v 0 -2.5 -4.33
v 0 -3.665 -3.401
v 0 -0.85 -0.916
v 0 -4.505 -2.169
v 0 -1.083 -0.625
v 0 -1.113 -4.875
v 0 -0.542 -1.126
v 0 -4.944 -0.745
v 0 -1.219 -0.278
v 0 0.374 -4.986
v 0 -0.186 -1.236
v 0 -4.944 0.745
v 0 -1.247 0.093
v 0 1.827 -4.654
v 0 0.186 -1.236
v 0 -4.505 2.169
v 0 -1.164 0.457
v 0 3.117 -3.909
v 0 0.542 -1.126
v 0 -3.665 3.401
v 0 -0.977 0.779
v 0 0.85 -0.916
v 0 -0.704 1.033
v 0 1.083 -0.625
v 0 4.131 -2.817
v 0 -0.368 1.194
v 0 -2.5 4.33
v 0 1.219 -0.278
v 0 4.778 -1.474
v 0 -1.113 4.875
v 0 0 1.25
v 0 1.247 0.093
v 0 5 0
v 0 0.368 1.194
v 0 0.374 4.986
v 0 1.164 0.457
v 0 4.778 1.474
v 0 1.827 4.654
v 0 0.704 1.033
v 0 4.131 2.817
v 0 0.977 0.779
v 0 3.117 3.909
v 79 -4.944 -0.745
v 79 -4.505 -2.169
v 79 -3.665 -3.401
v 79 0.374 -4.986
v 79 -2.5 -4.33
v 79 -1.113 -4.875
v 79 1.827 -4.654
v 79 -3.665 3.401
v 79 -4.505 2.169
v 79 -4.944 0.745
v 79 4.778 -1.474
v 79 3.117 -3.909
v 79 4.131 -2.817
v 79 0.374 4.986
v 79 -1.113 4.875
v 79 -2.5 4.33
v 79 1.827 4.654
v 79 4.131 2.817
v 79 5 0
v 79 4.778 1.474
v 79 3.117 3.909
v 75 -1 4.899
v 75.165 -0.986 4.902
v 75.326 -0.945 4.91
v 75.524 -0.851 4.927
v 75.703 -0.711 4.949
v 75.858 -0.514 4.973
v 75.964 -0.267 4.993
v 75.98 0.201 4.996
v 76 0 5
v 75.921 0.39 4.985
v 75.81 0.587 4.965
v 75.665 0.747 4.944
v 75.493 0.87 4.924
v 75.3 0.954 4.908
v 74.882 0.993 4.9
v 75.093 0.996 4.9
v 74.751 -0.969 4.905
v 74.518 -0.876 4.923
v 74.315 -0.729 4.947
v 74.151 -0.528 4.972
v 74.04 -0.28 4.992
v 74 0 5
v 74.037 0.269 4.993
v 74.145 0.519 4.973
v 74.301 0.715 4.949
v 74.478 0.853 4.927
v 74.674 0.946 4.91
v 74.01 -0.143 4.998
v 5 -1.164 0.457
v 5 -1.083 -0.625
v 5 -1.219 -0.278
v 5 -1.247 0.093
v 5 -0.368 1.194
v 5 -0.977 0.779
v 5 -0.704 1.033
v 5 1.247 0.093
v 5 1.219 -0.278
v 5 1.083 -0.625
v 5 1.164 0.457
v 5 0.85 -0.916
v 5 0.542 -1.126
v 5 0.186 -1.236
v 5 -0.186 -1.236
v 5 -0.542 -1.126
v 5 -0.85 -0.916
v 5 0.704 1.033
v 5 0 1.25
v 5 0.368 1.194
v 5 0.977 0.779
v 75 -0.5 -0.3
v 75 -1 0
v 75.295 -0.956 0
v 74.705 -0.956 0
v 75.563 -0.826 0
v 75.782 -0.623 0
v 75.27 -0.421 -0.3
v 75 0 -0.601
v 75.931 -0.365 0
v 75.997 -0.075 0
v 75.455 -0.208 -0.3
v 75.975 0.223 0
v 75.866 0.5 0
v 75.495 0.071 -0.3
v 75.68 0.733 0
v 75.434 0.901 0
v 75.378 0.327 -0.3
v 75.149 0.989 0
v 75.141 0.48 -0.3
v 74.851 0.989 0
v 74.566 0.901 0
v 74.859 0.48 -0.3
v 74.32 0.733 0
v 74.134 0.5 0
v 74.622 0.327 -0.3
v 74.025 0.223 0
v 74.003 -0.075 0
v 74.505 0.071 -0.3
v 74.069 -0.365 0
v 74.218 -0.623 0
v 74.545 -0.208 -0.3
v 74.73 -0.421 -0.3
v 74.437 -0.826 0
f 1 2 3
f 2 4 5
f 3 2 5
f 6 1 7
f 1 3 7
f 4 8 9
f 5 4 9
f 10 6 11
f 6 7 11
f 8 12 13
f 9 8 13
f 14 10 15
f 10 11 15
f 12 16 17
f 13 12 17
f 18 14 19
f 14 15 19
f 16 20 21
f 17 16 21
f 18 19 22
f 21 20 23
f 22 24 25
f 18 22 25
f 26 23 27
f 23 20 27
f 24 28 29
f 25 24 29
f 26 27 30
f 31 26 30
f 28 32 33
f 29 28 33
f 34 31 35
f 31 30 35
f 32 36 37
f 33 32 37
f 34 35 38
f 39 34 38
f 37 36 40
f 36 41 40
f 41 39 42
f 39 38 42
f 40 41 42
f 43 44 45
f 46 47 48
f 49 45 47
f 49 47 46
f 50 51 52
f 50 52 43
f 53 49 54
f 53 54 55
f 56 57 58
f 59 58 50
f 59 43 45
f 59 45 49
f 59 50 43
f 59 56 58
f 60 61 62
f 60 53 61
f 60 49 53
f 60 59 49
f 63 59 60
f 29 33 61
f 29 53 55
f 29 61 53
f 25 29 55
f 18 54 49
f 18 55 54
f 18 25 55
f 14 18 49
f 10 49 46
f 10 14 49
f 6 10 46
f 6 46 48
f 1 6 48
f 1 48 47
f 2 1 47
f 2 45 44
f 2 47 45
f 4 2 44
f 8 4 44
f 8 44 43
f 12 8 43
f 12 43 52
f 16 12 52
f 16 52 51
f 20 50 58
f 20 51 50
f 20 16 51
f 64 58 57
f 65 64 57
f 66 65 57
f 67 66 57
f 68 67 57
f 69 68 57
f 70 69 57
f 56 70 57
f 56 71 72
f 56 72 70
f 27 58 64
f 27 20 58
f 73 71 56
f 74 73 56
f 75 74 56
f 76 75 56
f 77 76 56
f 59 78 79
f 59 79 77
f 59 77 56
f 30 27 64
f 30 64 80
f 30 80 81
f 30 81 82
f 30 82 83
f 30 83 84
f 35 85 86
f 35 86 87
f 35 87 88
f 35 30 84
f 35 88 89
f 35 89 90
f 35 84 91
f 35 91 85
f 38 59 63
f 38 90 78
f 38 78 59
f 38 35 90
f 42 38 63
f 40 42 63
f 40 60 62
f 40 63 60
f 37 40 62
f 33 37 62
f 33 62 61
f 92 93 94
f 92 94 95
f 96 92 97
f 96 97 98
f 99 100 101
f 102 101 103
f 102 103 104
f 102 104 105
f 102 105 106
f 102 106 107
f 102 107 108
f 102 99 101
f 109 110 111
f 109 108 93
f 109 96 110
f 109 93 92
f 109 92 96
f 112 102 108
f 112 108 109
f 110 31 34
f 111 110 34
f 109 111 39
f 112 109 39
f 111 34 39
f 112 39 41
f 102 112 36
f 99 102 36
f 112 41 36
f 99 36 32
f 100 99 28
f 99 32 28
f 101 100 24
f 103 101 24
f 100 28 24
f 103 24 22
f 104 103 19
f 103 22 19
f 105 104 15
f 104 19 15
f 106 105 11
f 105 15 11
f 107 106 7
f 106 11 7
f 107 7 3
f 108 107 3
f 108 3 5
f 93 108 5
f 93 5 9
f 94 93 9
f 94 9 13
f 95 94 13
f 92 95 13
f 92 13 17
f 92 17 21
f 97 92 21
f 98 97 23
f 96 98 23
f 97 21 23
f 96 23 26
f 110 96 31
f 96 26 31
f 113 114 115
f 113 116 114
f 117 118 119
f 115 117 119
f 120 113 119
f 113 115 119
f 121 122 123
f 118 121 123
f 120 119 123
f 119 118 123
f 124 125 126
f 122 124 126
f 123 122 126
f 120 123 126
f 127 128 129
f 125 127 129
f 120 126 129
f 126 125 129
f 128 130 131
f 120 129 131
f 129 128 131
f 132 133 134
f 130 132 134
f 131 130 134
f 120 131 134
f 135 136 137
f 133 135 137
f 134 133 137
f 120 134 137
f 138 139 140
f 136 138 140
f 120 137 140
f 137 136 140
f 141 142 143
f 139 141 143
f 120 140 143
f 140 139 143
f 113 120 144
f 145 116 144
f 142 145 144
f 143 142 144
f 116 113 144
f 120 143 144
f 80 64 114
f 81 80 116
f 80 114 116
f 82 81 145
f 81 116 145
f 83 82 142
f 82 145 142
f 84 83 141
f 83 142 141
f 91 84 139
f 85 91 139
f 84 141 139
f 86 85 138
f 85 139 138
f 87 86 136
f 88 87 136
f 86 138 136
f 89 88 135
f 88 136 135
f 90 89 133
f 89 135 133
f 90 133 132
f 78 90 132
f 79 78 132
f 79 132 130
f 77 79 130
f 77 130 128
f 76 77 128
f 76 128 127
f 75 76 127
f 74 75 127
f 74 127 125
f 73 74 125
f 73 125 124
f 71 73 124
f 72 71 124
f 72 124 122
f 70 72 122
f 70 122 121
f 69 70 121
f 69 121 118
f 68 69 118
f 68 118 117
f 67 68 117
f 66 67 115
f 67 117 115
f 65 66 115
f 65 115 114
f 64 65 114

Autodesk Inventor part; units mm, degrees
ref_plane "YZ Plane" through (0, 0, 0) normal (1, 0, 0) x (0, 1, 0)
ref_plane "XZ Plane" through (0, 0, 0) normal (0, 1, 0) x (-1, 0, 0)
sketch "スケッチ1" plane through (0, 0, 0) normal (1, 0, 0) x (0, 1, 0)
  circle A0 centre (0, 0) radius 5
  dimension "d0" = 10
extrude "押し出し1" add sketch "スケッチ1" along normal blind 79
sketch "スケッチ2" plane through (0, 0, 0) normal (-1, 0, 0) x (0, 0, 1)
  circle A0 centre (0, 0) radius 1.25
  dimension "d3" = 2.5
extrude "押し出し2" cut sketch "スケッチ2" against normal blind 5
ref_plane "作業平面1" through (0, 0, 5) normal (0, 0, 1) x (1, 0, 0)
sketch "スケッチ3" plane through (0, 0, 5) normal (0, 0, 1) x (1, 0, 0)
  line L0 (79, -5) -> (79, 5) projected
  point P0 (0, 0)
  point P1 (75, 0)
  dimension "d6" = 4
hole "穴1" at (75, 0, 5) direction (0, 0, -1) diameter 2 depth 5 tip angle 118
properties part number "belt_liner_v5_shaft_2" material "アルミニウム 6061"
